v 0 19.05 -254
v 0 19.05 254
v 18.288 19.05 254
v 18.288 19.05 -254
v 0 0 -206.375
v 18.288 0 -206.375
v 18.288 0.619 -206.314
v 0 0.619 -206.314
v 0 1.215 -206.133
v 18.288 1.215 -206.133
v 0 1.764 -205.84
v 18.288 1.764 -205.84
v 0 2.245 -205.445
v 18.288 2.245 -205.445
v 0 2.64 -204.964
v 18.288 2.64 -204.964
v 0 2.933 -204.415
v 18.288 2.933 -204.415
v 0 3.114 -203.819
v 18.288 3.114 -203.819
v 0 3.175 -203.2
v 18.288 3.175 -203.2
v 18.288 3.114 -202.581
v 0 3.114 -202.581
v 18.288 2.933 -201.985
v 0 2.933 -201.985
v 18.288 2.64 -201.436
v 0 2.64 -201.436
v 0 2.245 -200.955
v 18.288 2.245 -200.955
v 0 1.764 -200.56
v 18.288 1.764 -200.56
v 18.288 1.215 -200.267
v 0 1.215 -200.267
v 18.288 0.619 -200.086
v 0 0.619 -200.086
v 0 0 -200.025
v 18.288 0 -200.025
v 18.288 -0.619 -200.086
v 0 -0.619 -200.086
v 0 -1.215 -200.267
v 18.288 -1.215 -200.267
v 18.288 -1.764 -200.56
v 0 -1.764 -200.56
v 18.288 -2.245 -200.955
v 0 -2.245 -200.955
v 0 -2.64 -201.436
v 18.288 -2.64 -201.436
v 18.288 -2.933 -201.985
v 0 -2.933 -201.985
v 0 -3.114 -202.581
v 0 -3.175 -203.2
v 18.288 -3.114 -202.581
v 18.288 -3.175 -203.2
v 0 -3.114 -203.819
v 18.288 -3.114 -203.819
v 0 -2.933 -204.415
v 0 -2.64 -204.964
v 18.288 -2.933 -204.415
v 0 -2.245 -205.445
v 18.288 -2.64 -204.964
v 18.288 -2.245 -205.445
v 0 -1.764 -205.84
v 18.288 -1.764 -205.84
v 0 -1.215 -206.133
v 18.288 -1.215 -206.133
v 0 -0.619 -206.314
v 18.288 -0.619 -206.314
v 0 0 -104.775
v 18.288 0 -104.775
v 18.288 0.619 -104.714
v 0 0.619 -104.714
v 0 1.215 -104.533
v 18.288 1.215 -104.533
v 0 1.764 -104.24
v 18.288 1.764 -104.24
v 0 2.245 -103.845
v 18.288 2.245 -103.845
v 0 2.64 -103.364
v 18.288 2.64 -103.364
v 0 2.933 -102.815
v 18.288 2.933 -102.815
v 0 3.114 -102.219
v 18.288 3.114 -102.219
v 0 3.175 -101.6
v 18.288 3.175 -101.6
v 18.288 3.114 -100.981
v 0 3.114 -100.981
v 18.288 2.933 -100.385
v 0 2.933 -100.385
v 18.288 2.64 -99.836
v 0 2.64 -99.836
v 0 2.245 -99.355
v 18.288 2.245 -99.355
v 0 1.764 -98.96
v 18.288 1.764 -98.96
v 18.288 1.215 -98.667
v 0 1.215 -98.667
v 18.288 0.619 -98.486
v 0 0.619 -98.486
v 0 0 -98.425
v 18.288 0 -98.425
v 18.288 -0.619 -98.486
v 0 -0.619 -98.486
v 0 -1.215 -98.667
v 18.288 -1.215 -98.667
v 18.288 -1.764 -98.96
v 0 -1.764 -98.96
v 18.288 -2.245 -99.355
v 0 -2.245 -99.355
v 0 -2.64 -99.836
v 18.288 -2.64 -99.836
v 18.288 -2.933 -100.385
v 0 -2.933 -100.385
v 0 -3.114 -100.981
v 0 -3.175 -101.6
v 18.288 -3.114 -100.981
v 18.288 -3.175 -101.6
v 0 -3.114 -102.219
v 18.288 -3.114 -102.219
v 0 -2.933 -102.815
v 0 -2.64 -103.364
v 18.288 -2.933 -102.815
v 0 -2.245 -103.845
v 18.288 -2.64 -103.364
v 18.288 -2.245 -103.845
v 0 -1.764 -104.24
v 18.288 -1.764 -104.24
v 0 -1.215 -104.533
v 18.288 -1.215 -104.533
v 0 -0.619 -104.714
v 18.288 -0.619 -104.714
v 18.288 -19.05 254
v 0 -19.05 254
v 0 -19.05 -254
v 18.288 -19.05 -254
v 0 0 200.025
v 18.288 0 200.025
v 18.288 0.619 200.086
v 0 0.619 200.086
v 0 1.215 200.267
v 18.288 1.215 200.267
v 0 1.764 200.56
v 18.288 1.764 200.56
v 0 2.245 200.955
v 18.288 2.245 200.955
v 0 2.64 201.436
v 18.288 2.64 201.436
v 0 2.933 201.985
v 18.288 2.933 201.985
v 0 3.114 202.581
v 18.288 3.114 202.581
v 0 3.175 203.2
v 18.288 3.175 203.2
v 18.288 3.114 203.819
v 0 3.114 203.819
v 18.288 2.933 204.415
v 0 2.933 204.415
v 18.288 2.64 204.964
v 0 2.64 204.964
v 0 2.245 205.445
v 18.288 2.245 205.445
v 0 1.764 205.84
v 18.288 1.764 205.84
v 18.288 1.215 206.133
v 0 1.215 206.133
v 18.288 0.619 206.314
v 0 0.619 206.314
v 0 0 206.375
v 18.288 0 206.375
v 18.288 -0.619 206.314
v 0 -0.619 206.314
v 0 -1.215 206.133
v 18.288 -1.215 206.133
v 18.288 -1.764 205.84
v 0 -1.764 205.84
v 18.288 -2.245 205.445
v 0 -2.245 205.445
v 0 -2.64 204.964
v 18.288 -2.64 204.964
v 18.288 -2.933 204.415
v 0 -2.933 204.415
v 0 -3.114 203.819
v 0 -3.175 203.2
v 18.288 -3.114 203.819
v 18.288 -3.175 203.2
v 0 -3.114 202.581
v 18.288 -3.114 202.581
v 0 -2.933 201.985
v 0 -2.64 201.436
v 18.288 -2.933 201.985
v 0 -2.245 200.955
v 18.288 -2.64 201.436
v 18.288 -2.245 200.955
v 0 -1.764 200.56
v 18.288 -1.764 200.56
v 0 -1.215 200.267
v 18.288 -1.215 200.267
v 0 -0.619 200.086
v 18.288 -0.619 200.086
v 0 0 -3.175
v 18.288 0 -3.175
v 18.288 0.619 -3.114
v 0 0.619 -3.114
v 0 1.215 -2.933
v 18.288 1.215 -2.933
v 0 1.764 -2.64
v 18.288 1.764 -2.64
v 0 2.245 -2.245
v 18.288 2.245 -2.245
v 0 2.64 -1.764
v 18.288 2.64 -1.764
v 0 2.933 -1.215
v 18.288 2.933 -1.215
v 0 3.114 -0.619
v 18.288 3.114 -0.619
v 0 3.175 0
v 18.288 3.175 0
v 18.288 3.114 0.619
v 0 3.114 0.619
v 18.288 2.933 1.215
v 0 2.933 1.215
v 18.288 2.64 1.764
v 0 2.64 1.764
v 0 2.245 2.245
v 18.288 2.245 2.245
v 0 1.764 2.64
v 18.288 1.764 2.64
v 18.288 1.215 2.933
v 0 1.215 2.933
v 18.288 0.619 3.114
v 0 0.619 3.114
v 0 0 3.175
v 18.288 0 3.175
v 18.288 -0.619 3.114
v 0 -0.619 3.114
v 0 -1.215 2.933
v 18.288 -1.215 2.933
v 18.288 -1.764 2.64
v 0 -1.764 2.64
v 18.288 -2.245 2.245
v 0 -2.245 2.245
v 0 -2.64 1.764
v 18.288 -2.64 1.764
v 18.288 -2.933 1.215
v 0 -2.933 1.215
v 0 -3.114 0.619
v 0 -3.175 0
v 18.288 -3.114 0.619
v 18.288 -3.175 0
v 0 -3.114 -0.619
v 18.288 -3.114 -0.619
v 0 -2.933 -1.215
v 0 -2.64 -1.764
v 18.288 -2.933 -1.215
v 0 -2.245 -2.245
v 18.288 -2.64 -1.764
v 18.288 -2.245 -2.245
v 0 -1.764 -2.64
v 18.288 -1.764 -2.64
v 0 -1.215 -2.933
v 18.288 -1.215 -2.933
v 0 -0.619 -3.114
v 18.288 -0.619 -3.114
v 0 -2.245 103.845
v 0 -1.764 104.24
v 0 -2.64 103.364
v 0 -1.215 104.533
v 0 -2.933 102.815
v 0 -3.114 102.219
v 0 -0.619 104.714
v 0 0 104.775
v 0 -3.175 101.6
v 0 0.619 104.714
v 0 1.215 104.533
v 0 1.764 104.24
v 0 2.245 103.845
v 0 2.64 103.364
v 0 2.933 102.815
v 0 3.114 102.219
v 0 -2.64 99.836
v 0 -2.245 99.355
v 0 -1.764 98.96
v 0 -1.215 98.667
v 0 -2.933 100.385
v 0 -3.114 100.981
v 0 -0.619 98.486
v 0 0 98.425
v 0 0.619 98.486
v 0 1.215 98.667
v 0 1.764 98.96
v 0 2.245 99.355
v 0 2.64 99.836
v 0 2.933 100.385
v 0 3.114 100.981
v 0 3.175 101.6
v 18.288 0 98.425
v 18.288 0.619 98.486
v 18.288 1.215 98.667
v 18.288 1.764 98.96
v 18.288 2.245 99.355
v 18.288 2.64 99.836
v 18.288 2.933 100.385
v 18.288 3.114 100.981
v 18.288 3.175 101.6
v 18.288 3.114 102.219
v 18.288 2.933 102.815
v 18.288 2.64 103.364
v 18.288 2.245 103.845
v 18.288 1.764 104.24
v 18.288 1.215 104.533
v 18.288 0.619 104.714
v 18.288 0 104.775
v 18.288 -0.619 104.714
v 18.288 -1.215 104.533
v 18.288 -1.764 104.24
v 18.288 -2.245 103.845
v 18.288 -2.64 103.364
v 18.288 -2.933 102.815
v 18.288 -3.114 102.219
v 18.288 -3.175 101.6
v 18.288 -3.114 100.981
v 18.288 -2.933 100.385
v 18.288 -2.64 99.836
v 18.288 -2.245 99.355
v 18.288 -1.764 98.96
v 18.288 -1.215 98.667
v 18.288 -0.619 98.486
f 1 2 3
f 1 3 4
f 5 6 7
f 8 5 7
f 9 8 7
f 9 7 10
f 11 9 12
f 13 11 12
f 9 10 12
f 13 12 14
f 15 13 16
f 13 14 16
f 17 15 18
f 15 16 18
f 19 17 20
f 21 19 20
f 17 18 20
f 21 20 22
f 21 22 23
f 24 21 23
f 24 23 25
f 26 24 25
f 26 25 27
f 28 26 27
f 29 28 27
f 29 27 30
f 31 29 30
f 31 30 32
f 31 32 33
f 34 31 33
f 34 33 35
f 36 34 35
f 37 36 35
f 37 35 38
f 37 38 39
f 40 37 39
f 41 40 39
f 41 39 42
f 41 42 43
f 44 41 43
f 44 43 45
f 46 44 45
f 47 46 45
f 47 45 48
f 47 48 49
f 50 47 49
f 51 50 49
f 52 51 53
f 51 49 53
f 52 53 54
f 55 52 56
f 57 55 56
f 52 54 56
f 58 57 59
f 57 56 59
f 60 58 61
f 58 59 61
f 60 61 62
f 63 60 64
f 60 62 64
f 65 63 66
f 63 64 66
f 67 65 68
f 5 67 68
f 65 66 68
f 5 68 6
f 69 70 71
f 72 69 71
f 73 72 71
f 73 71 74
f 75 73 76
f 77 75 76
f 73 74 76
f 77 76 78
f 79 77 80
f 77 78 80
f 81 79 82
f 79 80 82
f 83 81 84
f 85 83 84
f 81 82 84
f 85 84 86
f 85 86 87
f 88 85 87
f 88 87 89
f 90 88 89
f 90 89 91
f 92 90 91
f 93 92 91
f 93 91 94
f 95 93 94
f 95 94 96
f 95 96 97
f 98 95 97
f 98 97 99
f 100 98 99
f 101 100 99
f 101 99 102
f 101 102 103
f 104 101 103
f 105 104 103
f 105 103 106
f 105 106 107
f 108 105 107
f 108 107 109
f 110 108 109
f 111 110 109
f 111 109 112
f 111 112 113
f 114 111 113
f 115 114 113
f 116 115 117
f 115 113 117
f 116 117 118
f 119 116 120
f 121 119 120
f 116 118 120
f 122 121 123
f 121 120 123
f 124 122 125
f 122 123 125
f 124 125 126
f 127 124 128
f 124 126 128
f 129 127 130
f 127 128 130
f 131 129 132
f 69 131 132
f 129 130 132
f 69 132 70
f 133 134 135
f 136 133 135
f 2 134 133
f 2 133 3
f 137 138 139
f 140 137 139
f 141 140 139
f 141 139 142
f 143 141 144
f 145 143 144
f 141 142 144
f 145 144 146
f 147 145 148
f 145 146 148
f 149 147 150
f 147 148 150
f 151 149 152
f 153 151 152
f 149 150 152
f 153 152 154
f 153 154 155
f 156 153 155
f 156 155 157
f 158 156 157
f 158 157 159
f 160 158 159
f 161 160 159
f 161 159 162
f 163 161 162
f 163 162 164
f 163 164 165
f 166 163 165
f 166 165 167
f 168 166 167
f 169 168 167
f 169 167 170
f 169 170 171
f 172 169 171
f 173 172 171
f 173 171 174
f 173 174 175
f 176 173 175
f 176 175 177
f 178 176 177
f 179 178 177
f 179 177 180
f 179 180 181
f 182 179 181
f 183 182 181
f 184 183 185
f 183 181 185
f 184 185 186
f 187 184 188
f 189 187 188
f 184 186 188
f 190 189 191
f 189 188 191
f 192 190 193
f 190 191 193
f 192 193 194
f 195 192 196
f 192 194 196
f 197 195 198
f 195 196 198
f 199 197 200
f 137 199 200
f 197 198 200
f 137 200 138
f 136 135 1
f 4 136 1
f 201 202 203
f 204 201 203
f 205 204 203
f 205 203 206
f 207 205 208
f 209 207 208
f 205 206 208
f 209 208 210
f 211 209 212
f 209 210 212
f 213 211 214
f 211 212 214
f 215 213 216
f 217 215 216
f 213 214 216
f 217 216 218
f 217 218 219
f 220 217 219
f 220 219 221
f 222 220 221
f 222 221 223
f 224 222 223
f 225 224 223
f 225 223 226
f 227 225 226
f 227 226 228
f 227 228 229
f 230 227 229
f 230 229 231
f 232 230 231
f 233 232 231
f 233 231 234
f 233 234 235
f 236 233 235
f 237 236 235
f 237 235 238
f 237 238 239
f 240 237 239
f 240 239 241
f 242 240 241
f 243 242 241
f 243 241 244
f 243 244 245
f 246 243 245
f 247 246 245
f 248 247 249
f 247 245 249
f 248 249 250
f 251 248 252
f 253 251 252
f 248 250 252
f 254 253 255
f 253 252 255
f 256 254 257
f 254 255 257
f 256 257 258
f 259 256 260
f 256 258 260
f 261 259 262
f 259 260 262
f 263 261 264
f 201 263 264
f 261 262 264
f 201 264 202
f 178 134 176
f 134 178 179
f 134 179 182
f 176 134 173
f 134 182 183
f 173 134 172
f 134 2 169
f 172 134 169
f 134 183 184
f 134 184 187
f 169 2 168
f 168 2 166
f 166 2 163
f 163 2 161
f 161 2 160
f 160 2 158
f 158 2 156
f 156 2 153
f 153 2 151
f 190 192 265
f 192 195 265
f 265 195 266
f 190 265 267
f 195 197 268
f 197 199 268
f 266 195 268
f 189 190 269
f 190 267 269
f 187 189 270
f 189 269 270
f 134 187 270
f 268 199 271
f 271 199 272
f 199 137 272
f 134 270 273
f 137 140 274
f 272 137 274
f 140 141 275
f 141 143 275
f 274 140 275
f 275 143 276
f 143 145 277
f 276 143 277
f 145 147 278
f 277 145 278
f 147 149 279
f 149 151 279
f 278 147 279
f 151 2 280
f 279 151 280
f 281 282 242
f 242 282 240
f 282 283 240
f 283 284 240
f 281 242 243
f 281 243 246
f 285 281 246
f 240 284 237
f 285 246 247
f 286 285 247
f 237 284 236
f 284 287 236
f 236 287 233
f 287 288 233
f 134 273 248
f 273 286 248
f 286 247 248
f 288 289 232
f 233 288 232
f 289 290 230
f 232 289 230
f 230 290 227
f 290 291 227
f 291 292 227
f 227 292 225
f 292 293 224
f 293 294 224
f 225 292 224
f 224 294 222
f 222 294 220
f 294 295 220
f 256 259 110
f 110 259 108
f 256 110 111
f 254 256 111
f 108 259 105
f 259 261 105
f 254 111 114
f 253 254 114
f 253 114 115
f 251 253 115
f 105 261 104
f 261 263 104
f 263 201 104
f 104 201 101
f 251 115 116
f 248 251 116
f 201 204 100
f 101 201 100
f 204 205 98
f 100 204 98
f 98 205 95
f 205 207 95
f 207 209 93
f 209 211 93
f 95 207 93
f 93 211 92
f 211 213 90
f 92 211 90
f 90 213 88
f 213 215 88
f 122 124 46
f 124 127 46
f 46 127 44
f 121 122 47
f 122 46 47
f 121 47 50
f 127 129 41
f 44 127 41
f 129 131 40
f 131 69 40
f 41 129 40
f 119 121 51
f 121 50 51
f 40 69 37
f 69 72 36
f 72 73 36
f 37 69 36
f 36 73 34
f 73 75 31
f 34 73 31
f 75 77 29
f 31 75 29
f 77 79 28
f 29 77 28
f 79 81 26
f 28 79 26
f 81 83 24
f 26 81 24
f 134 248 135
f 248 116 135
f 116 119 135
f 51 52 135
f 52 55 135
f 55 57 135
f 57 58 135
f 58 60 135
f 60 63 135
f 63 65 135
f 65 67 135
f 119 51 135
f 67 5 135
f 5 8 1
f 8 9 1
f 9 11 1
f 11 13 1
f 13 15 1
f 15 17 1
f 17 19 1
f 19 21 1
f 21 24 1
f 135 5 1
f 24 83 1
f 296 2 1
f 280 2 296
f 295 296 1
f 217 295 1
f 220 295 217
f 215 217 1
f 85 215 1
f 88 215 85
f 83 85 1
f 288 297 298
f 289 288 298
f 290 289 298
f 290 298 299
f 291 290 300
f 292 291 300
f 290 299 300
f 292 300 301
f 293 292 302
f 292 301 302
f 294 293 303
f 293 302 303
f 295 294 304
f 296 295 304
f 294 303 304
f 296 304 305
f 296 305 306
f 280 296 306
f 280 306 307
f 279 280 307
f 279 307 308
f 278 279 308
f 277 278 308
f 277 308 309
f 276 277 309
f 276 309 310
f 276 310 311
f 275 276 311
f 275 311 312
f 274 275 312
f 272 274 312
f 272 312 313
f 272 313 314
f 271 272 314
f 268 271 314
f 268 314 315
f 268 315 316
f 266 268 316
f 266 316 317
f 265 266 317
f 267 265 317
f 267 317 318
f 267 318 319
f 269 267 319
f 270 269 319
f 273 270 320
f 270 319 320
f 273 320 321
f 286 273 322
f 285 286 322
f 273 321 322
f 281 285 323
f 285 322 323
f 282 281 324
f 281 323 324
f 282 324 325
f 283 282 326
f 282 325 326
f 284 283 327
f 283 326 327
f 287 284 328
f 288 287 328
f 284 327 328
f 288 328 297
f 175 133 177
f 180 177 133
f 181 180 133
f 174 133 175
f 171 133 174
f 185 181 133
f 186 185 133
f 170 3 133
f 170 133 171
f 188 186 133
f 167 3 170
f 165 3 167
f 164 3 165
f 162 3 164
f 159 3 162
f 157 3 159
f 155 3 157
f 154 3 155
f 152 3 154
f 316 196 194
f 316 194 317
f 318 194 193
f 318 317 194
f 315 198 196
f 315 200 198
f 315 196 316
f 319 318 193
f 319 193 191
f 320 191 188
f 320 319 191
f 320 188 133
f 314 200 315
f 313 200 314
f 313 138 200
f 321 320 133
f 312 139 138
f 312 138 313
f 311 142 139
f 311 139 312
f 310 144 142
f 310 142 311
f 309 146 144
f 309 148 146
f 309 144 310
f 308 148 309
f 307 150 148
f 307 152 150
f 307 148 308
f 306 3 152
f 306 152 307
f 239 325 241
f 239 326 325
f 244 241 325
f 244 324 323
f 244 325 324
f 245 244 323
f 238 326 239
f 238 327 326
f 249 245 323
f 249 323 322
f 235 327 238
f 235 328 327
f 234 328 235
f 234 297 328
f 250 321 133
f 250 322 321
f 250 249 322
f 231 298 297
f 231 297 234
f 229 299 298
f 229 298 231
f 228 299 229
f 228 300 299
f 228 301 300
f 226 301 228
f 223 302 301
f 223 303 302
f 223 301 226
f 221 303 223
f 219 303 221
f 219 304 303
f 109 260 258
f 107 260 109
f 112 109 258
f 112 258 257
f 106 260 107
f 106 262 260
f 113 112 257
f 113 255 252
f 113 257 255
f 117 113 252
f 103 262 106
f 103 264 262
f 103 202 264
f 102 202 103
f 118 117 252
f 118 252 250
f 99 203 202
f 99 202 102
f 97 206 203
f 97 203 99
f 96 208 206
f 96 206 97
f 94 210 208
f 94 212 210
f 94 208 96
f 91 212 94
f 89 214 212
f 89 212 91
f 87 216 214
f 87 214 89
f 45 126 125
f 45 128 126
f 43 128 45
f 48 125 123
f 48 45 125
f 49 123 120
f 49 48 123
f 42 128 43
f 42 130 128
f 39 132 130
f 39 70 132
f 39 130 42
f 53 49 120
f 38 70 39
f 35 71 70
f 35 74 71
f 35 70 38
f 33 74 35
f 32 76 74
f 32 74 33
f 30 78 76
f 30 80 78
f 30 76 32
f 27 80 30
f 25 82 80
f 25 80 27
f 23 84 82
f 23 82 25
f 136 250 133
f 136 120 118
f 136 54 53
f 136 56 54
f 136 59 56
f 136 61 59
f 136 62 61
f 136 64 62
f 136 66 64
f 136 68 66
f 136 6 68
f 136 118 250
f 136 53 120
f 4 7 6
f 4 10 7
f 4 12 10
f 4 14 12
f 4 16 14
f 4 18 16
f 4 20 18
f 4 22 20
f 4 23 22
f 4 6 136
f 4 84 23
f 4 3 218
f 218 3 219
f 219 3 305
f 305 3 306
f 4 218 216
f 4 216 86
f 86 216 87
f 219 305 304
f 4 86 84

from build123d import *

# Parameters (mm, degrees)
SKETCH1_W           = 508
SKETCH1_H           = 38.1
BOSS_EXTRUDE1_DEPTH = 18.288
SKETCH2_R           = 3.175
CUT_EXTRUDE1_DEPTH  = 256.369053419


with BuildPart() as part:
    # Sketch1 → Boss-Extrude1 (new body)
    with BuildSketch(Plane(origin=(0, 0, 0), x_dir=(0, 0, -1), z_dir=(1, 0, 0))):
        Rectangle(SKETCH1_W, SKETCH1_H)
    extrude(amount=BOSS_EXTRUDE1_DEPTH)

    # Sketch2 → Cut-Extrude1 (cut, through all)
    with BuildSketch(Plane(origin=(18.288, 0, 0), x_dir=(0, 0, -1), z_dir=(1, 0, 0))):
        with Locations((203.2, 0)):
            Circle(SKETCH2_R)
        with Locations((101.6, 0)):
            Circle(SKETCH2_R)
        Circle(SKETCH2_R)
        with Locations((-101.6, 0)):
            Circle(SKETCH2_R)
        with Locations((-203.2, 0)):
            Circle(SKETCH2_R)
    extrude(amount=-CUT_EXTRUDE1_DEPTH, mode=Mode.SUBTRACT)


solid = part.part
